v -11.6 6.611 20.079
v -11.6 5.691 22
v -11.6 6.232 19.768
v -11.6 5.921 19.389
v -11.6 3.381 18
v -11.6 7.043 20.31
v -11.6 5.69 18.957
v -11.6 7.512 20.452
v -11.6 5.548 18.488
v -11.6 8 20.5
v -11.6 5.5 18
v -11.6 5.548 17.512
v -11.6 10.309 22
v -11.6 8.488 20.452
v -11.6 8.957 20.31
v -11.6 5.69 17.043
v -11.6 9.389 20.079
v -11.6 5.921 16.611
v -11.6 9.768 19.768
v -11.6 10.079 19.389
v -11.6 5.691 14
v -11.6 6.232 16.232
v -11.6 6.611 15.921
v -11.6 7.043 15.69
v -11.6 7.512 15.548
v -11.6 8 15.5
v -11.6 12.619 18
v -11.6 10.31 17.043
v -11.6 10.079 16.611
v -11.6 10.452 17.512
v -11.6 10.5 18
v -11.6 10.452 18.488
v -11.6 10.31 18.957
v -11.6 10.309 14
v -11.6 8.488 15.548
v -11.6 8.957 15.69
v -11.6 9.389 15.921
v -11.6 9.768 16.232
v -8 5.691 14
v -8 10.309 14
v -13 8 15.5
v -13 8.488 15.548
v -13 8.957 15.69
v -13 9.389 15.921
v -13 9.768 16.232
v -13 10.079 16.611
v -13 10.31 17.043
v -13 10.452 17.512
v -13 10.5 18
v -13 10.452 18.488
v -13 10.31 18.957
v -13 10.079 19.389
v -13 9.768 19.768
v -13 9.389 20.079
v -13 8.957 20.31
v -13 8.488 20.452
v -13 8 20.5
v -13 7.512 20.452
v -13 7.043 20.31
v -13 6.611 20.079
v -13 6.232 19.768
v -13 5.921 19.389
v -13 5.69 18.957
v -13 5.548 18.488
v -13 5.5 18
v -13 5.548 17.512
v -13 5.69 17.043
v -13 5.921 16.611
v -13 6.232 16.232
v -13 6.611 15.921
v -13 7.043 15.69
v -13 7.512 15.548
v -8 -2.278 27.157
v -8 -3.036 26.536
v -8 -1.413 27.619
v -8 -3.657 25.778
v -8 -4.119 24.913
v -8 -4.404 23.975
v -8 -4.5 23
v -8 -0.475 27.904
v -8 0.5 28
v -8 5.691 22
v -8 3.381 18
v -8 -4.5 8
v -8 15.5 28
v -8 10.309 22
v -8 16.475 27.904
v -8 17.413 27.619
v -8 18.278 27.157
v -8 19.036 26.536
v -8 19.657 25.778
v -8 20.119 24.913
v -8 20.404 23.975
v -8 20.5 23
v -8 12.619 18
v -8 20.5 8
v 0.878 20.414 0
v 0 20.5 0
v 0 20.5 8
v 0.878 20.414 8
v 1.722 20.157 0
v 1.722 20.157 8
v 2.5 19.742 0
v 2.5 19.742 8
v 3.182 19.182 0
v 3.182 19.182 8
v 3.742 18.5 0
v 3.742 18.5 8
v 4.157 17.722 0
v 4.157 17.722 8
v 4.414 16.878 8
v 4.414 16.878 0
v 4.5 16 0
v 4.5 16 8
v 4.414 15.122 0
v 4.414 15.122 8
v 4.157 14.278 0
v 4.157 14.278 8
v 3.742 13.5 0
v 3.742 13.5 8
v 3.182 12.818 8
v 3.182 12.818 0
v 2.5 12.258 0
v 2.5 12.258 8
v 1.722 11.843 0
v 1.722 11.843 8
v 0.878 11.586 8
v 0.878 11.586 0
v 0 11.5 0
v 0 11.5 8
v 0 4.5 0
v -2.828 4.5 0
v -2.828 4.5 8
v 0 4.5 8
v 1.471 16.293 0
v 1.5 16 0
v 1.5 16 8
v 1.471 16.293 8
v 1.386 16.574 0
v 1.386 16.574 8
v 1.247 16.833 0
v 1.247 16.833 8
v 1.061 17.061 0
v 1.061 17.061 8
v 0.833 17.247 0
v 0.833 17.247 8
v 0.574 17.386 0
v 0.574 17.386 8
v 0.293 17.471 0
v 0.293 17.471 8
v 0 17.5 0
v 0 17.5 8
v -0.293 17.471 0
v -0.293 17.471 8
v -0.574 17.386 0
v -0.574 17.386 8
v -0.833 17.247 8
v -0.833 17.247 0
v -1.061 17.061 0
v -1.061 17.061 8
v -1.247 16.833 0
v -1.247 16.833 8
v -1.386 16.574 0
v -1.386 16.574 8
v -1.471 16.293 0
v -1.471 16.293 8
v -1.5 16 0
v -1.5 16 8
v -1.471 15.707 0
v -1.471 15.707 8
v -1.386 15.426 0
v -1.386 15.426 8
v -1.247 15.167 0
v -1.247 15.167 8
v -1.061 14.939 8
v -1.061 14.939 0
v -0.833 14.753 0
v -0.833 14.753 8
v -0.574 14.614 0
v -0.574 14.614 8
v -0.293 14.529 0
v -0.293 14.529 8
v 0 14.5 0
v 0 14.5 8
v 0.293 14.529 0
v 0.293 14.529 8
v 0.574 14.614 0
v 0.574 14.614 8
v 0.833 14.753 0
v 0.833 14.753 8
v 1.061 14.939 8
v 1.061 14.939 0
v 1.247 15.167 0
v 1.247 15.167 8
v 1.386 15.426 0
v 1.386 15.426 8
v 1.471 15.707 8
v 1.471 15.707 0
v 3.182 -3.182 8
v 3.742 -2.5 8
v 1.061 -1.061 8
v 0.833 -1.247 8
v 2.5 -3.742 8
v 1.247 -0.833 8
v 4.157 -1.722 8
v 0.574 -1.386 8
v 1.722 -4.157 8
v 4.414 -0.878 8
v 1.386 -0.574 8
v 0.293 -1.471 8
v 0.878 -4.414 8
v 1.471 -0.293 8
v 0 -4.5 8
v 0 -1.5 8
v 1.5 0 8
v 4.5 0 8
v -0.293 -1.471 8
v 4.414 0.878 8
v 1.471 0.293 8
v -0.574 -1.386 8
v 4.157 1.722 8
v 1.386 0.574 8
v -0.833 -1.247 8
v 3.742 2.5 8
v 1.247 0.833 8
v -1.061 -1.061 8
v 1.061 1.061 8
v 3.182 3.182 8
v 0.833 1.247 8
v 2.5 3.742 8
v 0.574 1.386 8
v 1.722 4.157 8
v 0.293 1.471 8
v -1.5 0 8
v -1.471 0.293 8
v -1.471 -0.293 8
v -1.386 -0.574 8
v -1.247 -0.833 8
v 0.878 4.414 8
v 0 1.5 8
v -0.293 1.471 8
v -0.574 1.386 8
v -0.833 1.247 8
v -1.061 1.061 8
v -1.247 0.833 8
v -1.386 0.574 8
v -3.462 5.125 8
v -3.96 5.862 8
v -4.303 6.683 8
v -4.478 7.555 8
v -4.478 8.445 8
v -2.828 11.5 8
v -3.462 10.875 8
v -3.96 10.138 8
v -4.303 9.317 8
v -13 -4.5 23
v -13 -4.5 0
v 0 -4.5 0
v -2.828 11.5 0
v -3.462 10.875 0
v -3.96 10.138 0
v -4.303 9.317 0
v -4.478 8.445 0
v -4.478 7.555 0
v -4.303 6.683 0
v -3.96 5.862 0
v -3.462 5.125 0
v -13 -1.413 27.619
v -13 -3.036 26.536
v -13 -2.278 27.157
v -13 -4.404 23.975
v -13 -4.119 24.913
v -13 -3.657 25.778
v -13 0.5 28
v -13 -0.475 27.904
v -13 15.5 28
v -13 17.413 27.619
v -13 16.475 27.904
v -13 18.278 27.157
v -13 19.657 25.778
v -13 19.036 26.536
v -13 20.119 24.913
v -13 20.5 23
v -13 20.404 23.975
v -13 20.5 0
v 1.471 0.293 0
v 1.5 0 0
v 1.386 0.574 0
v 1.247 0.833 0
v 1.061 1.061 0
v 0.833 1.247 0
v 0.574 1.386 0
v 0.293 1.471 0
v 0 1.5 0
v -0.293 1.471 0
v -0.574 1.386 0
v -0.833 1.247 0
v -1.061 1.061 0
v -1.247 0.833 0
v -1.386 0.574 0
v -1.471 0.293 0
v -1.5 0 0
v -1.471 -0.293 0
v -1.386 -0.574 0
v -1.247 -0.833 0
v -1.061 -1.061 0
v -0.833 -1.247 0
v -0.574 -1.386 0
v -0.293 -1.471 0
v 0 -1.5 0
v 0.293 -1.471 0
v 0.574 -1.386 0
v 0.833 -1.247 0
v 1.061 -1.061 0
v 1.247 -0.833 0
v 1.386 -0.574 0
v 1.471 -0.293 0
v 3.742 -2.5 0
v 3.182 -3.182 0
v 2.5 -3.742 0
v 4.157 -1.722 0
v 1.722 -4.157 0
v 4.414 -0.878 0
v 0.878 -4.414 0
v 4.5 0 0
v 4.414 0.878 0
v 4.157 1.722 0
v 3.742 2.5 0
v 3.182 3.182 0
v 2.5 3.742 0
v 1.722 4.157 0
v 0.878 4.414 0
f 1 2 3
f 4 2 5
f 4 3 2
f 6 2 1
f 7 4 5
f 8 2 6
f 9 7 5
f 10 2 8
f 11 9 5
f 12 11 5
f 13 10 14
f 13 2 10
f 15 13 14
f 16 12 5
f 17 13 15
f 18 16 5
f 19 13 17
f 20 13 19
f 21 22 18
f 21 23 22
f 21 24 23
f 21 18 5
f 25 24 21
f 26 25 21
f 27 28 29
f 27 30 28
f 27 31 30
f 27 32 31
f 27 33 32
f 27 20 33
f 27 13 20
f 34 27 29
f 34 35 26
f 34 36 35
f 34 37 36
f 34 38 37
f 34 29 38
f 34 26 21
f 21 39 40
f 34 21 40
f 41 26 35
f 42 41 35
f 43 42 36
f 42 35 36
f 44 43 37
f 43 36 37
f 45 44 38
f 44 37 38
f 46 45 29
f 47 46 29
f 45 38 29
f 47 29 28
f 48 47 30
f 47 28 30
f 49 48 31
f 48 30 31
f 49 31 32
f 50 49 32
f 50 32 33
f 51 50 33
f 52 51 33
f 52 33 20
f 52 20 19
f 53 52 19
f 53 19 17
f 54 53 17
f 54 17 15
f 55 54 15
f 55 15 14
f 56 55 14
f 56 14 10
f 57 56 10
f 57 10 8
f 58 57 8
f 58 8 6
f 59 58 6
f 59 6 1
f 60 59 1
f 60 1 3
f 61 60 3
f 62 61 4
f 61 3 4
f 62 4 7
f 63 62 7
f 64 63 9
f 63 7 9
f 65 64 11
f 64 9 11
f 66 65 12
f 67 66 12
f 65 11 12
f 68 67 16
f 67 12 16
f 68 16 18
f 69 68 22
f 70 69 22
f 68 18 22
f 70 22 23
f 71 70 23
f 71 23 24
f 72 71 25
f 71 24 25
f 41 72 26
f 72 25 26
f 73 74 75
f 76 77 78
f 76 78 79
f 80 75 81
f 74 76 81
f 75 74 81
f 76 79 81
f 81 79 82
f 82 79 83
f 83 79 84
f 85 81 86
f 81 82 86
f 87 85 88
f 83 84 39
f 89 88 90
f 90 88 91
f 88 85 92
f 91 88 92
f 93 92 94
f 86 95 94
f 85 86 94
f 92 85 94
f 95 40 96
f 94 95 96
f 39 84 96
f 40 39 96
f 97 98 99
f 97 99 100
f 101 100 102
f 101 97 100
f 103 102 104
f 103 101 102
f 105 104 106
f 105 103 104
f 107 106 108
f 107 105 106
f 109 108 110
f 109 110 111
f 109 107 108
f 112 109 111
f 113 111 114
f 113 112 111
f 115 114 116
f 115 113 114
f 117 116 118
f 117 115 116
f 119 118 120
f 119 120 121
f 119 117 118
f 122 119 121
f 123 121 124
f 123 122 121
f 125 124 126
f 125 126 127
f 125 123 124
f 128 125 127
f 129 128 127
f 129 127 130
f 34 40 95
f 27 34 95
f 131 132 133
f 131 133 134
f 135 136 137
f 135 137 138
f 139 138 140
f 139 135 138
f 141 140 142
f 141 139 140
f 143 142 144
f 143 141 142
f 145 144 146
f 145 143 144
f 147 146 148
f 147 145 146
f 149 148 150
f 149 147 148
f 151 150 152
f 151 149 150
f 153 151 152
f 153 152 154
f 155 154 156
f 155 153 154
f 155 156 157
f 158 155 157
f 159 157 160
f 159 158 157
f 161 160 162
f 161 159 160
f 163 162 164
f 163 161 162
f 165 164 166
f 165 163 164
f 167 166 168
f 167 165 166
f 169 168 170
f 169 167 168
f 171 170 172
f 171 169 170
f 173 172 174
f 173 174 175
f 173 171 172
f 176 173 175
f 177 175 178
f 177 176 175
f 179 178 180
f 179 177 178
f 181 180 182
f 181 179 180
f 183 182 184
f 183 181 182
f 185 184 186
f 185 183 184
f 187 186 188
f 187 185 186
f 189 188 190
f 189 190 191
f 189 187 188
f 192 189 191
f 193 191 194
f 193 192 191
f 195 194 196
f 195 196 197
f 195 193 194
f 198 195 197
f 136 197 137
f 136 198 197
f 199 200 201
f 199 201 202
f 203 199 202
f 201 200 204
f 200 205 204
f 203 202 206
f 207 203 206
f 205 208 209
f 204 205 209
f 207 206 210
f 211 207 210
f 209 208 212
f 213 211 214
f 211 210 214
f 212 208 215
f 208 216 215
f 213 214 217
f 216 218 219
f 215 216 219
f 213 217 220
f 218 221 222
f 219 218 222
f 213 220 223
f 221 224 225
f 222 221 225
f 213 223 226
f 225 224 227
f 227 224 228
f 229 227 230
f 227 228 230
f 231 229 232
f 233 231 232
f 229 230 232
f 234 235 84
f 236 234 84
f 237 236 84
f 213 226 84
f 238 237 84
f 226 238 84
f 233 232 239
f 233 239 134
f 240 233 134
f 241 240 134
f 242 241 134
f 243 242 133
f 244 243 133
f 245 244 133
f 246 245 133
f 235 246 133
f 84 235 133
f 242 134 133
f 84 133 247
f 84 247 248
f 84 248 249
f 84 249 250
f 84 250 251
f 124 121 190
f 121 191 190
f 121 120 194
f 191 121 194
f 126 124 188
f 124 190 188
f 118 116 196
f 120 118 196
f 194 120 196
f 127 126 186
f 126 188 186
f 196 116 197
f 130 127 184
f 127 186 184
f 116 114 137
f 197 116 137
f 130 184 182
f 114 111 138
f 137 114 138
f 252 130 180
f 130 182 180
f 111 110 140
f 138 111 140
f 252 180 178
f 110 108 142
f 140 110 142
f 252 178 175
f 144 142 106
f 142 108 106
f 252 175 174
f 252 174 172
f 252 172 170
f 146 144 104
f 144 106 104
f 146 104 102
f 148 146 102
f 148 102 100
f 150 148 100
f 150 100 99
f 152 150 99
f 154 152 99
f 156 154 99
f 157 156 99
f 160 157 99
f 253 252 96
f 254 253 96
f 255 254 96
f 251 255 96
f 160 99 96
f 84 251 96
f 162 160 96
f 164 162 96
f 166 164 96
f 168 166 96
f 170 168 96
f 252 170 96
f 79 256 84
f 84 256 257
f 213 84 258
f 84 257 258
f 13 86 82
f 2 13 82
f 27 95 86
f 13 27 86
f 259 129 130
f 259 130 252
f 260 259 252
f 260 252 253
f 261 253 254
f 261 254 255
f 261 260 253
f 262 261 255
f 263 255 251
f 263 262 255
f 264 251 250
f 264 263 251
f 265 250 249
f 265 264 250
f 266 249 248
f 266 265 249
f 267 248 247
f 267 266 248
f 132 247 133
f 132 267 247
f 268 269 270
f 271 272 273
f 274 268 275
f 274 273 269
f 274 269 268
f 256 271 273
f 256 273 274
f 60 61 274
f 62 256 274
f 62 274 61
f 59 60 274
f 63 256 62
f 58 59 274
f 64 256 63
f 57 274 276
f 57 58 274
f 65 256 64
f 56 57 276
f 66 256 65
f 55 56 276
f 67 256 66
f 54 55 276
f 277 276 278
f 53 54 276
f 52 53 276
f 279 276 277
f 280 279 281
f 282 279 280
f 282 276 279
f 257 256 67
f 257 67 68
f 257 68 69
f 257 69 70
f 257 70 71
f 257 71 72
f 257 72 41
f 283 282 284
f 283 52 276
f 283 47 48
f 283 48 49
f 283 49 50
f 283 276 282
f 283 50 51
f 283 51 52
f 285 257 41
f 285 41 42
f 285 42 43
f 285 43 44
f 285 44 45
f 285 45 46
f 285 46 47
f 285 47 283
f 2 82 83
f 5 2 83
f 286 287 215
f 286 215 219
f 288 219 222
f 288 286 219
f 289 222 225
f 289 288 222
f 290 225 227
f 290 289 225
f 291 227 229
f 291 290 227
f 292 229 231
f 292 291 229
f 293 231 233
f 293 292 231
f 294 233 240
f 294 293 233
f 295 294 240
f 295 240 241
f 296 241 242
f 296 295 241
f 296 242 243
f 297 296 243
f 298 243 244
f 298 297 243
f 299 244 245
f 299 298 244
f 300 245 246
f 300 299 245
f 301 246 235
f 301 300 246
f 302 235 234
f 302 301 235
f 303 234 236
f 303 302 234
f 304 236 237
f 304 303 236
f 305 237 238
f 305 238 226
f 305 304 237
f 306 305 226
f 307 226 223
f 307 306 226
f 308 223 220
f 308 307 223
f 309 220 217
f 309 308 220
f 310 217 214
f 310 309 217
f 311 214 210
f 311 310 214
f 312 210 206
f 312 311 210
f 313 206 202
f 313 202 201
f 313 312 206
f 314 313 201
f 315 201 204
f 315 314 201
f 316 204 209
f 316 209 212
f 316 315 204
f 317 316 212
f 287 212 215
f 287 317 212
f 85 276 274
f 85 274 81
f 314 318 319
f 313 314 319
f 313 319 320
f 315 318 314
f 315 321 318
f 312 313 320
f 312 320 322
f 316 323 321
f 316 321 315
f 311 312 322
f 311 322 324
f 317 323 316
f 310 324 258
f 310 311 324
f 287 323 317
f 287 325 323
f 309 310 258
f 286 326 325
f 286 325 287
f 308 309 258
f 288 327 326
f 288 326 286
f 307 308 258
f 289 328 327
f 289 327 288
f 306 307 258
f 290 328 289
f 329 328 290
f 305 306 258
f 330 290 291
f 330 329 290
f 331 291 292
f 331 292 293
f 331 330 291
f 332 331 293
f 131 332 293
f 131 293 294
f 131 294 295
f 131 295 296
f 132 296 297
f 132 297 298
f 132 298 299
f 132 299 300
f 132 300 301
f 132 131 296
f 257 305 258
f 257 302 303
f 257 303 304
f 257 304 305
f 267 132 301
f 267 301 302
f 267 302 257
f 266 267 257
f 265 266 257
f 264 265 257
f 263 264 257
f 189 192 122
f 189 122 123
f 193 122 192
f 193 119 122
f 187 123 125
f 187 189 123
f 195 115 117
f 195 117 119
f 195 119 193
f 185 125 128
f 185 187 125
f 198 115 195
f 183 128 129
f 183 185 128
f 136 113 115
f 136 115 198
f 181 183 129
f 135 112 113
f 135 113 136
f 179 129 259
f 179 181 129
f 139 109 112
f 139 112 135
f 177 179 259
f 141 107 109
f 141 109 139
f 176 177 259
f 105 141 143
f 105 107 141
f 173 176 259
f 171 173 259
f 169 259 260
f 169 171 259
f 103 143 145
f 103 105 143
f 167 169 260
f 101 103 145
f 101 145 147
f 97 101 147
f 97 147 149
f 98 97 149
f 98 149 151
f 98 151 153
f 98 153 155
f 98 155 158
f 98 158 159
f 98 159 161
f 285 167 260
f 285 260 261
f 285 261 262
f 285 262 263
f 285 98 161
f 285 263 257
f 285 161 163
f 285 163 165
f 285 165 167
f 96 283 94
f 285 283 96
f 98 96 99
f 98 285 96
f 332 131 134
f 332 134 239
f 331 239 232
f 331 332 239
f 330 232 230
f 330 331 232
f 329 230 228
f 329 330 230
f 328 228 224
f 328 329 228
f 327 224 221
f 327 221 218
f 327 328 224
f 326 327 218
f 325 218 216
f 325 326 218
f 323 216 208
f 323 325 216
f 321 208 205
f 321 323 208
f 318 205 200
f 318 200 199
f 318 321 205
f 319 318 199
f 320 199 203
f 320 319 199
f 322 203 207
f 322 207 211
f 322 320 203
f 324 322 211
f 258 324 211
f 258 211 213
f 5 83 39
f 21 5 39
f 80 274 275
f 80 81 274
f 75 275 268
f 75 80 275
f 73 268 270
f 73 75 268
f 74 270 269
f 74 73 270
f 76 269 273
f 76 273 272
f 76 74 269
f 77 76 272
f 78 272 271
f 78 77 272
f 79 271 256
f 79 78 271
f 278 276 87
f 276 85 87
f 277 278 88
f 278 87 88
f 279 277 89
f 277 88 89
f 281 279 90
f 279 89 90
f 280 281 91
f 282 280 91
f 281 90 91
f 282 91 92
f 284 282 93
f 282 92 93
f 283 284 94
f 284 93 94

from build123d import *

# Parameters (mm, degrees)
CROQUIS1_R              = 1.5
SALIENTE_EXTRUIR1_DEPTH = 8
CROQUIS2_W              = 5
CROQUIS2_H              = 25
SALIENTE_EXTRUIR2_DEPTH = 20
CROQUIS3_R              = 2.5
CORTAR_EXTRUIR1_DEPTH   = 20
CORTAR_EXTRUIR2_DEPTH   = 3.6
REDONDEO1_R             = 5


with BuildPart() as part:
    # Croquis1 → Saliente-Extruir1 (new body)
    with BuildSketch(Plane.XY):
        with BuildLine():
            Line((-13, 20.5), (0, 20.5))
            ThreePointArc((0, 20.5), (4.5, 16), (0, 11.5))
            Line((0, 11.5), (-2.828427125, 11.5))
            ThreePointArc((-2.828427125, 11.5), (-4.5, 8), (-2.828427125, 4.5))
            Line((-2.828427125, 4.5), (0, 4.5))
            ThreePointArc((0, 4.5), (4.5, 0), (0, -4.5))
            Line((0, -4.5), (-13, -4.5))
            Line((-13, -4.5), (-13, 20.5))
        make_face()
        Circle(CROQUIS1_R, mode=Mode.SUBTRACT)
        with Locations((0, 16)):
            Circle(CROQUIS1_R, mode=Mode.SUBTRACT)
    extrude(amount=SALIENTE_EXTRUIR1_DEPTH)

    # Croquis2 → Saliente-Extruir2 (add)
    with BuildSketch(Plane.XY.offset(8)):
        with Locations((-10.5, 8)):
            Rectangle(CROQUIS2_W, CROQUIS2_H)
    extrude(amount=SALIENTE_EXTRUIR2_DEPTH)

    # Croquis3 → Cortar-Extruir1 (cut)
    with BuildSketch(Plane(origin=(-8, 0, 0), x_dir=(0, 0, -1), z_dir=(1, 0, 0))):
        with Locations((-18, 8)):
            Circle(CROQUIS3_R)
    extrude(amount=-CORTAR_EXTRUIR1_DEPTH, mode=Mode.SUBTRACT)

    # Croquis4 → Cortar-Extruir2 (cut)
    with BuildSketch(Plane(origin=(-8, 0, 0), x_dir=(0, 0, -1), z_dir=(1, 0, 0))):
        Polygon((-18, 3.381197846), (-14, 5.690598923), (-14, 10.309401077), (-18, 12.618802154), (-22, 10.309401077), (-22, 5.690598923), align=None)
    extrude(amount=-CORTAR_EXTRUIR2_DEPTH, mode=Mode.SUBTRACT)

    # Redondeo1
    redondeo1_edges = [part.edges().sort_by_distance(p)[0] for p in [
        (-10.5, -4.5, 28),
        (-10.5, 20.5, 28),
    ]]
    fillet(redondeo1_edges, radius=REDONDEO1_R)


solid = part.part
